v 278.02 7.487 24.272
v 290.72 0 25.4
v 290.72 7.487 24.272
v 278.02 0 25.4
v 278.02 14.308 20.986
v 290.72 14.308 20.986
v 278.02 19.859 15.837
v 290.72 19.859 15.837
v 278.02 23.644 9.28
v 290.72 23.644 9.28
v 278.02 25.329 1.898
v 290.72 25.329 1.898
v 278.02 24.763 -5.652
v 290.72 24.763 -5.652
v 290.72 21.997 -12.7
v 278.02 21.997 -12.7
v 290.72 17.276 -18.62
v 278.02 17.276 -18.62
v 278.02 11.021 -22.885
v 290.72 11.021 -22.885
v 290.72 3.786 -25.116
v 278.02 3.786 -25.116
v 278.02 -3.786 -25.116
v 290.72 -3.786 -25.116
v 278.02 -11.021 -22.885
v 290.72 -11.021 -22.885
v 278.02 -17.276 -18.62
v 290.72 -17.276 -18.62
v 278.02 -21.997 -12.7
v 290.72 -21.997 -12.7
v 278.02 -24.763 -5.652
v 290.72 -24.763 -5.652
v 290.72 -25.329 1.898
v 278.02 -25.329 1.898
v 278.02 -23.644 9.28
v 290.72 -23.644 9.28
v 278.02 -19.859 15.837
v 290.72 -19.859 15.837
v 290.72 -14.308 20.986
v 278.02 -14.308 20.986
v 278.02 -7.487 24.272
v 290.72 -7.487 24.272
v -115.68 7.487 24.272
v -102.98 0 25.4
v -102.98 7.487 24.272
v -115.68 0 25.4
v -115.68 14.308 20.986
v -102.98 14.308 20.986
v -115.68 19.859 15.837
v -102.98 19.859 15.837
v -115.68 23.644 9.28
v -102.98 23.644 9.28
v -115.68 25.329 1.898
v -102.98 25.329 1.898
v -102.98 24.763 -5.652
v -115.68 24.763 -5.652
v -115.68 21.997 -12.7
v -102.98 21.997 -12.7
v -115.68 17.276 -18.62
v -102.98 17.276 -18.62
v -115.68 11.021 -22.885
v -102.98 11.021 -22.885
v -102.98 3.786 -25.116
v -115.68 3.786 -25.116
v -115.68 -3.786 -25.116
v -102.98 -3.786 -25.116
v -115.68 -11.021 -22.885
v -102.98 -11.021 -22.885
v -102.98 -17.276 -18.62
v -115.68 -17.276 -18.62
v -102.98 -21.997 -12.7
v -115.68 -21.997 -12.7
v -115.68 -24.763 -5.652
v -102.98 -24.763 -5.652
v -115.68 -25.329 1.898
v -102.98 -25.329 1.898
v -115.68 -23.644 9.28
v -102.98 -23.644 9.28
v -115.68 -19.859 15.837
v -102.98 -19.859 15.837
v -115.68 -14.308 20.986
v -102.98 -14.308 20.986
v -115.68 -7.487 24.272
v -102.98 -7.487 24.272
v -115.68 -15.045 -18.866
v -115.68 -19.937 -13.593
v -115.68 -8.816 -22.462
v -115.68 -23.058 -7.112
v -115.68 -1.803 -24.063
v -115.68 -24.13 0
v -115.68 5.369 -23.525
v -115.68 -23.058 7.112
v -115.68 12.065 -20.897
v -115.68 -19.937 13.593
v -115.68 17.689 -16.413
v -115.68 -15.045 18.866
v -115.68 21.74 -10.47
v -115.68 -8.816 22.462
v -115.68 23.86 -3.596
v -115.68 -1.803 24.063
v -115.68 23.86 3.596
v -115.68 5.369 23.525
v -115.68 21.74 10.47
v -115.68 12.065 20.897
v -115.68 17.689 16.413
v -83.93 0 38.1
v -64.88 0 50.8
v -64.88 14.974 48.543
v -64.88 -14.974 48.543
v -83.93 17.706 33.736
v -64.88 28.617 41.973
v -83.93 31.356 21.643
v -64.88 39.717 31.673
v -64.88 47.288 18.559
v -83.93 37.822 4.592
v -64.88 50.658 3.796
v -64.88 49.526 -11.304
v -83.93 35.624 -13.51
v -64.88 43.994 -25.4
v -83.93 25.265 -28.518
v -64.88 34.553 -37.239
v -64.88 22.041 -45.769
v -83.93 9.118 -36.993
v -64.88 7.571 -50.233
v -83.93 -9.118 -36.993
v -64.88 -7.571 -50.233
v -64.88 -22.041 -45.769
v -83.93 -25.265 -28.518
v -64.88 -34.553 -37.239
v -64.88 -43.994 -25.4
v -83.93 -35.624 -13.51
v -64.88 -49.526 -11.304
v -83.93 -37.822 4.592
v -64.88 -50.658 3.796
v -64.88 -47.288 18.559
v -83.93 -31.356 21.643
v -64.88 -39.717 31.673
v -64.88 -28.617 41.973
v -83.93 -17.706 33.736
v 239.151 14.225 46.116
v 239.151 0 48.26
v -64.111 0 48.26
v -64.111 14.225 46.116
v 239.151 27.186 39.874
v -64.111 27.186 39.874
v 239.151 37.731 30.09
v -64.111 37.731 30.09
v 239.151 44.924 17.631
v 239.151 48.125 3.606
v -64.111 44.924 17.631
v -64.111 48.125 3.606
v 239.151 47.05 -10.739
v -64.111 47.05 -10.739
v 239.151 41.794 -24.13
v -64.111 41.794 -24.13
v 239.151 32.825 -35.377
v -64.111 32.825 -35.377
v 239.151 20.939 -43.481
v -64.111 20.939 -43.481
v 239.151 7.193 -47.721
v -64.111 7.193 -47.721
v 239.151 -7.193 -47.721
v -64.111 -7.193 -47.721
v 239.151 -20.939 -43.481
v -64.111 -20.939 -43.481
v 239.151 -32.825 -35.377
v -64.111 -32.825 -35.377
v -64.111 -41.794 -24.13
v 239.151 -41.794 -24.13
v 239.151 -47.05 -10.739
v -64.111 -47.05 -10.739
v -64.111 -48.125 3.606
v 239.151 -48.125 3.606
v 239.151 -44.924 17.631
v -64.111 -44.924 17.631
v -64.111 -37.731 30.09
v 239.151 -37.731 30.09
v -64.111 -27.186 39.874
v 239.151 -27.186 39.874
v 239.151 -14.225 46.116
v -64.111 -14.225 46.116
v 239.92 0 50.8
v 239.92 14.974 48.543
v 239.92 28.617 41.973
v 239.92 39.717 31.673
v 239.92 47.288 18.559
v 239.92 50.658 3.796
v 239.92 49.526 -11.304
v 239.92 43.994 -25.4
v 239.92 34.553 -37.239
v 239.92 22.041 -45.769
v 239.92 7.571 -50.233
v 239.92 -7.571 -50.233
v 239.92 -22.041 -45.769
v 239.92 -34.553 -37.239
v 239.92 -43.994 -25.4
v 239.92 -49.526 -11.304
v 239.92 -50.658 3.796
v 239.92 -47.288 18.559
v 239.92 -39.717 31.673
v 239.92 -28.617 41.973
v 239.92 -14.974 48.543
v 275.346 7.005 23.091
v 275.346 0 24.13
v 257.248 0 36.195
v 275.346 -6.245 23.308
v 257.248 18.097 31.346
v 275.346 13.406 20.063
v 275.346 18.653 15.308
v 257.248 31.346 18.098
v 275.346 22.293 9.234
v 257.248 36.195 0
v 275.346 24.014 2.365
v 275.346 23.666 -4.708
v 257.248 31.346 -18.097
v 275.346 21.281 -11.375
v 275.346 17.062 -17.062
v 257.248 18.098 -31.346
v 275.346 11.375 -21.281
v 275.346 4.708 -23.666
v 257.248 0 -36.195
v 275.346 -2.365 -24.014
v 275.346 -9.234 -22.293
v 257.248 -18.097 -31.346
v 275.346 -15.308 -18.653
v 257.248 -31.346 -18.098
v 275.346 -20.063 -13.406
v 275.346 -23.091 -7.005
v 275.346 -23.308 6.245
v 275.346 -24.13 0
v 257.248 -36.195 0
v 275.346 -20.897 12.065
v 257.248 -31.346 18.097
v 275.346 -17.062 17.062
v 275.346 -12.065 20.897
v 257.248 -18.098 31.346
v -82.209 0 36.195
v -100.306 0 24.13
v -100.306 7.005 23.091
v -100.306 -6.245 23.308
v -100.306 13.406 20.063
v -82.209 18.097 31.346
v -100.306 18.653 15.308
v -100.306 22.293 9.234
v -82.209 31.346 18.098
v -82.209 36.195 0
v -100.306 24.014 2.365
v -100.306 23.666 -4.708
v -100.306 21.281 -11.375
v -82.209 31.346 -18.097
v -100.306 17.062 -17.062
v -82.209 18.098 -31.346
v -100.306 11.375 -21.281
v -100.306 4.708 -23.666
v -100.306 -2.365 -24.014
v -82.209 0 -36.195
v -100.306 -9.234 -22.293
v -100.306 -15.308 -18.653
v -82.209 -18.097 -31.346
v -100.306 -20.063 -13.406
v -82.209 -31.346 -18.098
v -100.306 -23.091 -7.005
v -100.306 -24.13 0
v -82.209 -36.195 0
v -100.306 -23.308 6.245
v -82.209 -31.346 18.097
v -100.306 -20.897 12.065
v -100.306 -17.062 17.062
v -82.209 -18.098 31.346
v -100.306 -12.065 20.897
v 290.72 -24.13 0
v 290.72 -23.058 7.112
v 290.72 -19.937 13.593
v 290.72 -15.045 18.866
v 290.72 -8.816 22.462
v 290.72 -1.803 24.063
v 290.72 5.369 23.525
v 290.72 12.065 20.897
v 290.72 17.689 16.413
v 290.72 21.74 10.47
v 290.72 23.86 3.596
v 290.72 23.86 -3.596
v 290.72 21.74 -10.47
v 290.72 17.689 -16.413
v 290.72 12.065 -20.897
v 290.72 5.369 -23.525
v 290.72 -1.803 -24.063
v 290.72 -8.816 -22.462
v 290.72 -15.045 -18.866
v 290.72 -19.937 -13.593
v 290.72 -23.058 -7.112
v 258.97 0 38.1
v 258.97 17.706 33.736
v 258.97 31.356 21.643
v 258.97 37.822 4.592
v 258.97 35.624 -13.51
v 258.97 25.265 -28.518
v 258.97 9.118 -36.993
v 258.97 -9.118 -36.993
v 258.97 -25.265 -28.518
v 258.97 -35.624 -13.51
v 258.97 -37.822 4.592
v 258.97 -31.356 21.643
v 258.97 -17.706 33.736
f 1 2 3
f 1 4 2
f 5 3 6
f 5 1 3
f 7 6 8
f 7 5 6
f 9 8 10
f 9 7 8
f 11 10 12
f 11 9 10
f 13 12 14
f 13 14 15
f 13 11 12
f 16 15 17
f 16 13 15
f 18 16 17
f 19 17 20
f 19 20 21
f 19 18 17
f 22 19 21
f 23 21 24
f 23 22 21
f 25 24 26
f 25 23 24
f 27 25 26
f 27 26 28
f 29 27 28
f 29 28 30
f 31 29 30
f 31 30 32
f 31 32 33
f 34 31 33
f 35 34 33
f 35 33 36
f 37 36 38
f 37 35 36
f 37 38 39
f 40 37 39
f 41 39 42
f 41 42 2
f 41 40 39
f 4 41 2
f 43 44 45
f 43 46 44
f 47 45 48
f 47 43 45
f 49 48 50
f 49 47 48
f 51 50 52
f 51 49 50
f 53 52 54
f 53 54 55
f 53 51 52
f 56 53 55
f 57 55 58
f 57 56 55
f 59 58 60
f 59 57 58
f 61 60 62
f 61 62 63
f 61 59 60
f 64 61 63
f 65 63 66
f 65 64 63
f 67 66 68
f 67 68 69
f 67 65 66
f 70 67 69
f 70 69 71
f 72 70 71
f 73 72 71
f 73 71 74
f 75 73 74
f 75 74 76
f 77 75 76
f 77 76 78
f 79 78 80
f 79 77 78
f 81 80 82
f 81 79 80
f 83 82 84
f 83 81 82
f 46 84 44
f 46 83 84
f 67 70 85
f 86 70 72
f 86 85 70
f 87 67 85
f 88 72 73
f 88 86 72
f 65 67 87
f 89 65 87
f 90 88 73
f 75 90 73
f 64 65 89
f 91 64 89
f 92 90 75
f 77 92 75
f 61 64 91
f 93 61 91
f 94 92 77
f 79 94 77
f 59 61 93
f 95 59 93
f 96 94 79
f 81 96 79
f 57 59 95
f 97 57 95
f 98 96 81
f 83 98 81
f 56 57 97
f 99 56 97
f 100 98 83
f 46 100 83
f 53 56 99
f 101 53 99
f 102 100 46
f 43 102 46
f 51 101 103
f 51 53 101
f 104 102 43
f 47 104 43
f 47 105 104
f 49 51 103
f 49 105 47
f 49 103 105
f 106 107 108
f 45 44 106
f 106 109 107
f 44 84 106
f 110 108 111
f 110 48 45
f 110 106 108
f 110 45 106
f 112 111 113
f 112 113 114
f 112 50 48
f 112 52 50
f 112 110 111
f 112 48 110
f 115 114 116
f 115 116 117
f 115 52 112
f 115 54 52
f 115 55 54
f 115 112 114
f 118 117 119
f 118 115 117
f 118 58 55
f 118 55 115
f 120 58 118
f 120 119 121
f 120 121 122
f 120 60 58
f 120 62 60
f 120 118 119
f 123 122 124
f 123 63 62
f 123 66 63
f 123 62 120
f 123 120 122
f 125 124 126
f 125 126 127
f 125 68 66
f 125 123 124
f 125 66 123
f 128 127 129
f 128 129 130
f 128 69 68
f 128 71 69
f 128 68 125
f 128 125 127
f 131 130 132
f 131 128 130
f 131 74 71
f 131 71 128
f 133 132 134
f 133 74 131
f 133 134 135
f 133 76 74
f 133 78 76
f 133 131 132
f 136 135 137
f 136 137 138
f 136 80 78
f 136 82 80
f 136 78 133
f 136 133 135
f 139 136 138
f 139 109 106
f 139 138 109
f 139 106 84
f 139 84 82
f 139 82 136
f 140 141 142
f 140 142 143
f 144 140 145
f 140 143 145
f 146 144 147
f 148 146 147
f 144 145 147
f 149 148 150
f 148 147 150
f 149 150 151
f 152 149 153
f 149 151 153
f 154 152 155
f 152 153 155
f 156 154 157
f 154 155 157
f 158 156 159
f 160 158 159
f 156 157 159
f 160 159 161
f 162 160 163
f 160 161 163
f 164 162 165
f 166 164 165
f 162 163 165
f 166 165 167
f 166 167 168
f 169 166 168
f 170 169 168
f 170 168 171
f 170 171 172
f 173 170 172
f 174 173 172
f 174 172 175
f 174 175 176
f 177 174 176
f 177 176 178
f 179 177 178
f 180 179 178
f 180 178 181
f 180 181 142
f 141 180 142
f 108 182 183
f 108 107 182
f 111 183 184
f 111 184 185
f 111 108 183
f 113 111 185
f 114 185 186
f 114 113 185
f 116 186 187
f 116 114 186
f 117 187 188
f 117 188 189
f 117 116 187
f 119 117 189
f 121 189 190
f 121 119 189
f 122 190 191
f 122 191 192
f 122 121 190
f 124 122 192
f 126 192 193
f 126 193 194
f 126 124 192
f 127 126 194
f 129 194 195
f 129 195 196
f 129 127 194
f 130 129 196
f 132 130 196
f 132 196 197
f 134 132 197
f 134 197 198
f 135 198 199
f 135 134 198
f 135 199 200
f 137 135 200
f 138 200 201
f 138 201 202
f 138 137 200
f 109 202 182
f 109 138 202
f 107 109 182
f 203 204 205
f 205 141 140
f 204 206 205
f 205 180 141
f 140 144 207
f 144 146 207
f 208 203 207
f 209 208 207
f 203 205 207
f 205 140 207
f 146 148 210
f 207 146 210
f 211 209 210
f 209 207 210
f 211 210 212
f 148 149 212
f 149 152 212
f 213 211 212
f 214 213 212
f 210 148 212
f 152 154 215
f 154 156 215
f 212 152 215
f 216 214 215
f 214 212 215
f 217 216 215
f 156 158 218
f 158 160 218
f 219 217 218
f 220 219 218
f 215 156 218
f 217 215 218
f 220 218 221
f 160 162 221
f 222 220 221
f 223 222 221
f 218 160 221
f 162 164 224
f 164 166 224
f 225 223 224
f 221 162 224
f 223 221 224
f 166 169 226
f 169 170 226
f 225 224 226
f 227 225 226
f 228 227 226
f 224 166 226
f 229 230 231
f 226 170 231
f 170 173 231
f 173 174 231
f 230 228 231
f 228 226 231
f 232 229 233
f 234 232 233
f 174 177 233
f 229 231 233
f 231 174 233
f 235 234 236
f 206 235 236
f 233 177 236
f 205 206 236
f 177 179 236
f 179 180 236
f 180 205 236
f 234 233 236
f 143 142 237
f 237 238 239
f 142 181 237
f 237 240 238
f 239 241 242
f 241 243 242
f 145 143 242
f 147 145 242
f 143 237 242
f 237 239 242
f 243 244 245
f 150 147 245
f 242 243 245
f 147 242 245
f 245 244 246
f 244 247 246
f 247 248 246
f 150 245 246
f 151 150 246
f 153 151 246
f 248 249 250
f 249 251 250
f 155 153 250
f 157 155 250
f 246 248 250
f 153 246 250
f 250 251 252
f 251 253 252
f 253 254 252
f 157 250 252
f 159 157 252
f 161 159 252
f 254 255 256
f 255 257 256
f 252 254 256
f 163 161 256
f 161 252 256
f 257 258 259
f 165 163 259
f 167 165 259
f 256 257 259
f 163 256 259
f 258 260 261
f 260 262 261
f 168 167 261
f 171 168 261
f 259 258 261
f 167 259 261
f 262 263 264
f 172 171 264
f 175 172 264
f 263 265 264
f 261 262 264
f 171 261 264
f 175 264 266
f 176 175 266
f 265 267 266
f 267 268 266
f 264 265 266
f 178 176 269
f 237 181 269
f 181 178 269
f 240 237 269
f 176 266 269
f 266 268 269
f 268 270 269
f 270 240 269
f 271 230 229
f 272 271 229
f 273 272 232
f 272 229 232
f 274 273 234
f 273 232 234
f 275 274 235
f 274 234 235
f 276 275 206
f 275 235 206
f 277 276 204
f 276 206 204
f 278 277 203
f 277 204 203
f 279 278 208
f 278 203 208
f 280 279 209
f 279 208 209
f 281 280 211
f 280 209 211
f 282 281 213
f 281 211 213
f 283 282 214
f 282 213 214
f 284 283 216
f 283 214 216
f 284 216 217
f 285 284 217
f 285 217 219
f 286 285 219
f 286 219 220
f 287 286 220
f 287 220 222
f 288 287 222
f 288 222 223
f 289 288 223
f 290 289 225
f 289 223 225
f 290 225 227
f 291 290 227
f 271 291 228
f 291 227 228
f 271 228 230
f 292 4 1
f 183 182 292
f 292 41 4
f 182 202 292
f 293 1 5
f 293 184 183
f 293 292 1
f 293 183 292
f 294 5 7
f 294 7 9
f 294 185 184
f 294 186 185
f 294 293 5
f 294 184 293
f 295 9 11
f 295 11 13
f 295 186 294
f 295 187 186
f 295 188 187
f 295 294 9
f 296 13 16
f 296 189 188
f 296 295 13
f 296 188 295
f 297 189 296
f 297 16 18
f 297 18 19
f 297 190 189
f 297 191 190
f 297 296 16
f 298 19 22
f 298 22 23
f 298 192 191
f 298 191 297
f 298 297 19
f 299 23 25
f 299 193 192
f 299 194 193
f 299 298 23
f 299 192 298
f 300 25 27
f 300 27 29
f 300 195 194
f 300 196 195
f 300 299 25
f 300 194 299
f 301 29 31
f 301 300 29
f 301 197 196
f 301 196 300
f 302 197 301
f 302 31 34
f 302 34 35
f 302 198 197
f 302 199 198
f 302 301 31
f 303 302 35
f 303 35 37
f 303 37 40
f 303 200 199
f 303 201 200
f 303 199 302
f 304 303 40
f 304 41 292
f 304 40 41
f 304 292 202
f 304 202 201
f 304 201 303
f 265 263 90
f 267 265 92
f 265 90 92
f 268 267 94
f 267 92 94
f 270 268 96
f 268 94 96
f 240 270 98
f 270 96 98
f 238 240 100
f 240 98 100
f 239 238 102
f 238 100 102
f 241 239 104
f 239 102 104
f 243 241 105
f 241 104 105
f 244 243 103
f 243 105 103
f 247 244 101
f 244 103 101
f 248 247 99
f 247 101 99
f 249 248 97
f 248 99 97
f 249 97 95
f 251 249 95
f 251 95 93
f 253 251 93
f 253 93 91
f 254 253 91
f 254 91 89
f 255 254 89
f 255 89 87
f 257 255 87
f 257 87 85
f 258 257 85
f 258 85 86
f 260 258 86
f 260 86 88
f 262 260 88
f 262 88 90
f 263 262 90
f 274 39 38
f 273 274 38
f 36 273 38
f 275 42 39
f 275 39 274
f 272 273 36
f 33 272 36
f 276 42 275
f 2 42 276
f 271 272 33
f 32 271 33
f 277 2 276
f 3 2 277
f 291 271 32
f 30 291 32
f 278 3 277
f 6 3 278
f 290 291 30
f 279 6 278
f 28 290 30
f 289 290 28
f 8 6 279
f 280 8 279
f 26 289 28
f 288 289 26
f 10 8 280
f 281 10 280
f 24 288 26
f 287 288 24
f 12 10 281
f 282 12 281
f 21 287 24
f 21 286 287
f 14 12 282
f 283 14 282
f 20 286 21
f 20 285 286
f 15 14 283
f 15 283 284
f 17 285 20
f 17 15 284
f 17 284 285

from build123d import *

# Parameters (mm, degrees)
F2_T = -2.54
F4_D = 48.26


with BuildPart() as f1:
    # F0 (on Front) → F1 (revolve)
    with BuildSketch(Plane.XZ):
        Polygon((-115.680311, 25.4), (-115.680311, 0), (290.719689, 0), (290.719689, 25.4), (278.019689, 25.4), (239.919689, 50.8), (-64.880311, 50.8), (-102.980311, 25.4), align=None)
    revolve(axis=Axis((87.519689, 0, 0), (-1, 0, 0)))

    # F2
    f2_openings = [f1.faces().sort_by_distance(p)[0] for p in [
        (-115.680311, 0, 0),
    ]]
    offset(amount=F2_T, openings=f2_openings)

    # F4 (through all)
    with Locations(Plane.YZ.offset(290.719689)):
        with Locations((0, 0)):
            Hole(F4_D / 2)


solid = f1.part
